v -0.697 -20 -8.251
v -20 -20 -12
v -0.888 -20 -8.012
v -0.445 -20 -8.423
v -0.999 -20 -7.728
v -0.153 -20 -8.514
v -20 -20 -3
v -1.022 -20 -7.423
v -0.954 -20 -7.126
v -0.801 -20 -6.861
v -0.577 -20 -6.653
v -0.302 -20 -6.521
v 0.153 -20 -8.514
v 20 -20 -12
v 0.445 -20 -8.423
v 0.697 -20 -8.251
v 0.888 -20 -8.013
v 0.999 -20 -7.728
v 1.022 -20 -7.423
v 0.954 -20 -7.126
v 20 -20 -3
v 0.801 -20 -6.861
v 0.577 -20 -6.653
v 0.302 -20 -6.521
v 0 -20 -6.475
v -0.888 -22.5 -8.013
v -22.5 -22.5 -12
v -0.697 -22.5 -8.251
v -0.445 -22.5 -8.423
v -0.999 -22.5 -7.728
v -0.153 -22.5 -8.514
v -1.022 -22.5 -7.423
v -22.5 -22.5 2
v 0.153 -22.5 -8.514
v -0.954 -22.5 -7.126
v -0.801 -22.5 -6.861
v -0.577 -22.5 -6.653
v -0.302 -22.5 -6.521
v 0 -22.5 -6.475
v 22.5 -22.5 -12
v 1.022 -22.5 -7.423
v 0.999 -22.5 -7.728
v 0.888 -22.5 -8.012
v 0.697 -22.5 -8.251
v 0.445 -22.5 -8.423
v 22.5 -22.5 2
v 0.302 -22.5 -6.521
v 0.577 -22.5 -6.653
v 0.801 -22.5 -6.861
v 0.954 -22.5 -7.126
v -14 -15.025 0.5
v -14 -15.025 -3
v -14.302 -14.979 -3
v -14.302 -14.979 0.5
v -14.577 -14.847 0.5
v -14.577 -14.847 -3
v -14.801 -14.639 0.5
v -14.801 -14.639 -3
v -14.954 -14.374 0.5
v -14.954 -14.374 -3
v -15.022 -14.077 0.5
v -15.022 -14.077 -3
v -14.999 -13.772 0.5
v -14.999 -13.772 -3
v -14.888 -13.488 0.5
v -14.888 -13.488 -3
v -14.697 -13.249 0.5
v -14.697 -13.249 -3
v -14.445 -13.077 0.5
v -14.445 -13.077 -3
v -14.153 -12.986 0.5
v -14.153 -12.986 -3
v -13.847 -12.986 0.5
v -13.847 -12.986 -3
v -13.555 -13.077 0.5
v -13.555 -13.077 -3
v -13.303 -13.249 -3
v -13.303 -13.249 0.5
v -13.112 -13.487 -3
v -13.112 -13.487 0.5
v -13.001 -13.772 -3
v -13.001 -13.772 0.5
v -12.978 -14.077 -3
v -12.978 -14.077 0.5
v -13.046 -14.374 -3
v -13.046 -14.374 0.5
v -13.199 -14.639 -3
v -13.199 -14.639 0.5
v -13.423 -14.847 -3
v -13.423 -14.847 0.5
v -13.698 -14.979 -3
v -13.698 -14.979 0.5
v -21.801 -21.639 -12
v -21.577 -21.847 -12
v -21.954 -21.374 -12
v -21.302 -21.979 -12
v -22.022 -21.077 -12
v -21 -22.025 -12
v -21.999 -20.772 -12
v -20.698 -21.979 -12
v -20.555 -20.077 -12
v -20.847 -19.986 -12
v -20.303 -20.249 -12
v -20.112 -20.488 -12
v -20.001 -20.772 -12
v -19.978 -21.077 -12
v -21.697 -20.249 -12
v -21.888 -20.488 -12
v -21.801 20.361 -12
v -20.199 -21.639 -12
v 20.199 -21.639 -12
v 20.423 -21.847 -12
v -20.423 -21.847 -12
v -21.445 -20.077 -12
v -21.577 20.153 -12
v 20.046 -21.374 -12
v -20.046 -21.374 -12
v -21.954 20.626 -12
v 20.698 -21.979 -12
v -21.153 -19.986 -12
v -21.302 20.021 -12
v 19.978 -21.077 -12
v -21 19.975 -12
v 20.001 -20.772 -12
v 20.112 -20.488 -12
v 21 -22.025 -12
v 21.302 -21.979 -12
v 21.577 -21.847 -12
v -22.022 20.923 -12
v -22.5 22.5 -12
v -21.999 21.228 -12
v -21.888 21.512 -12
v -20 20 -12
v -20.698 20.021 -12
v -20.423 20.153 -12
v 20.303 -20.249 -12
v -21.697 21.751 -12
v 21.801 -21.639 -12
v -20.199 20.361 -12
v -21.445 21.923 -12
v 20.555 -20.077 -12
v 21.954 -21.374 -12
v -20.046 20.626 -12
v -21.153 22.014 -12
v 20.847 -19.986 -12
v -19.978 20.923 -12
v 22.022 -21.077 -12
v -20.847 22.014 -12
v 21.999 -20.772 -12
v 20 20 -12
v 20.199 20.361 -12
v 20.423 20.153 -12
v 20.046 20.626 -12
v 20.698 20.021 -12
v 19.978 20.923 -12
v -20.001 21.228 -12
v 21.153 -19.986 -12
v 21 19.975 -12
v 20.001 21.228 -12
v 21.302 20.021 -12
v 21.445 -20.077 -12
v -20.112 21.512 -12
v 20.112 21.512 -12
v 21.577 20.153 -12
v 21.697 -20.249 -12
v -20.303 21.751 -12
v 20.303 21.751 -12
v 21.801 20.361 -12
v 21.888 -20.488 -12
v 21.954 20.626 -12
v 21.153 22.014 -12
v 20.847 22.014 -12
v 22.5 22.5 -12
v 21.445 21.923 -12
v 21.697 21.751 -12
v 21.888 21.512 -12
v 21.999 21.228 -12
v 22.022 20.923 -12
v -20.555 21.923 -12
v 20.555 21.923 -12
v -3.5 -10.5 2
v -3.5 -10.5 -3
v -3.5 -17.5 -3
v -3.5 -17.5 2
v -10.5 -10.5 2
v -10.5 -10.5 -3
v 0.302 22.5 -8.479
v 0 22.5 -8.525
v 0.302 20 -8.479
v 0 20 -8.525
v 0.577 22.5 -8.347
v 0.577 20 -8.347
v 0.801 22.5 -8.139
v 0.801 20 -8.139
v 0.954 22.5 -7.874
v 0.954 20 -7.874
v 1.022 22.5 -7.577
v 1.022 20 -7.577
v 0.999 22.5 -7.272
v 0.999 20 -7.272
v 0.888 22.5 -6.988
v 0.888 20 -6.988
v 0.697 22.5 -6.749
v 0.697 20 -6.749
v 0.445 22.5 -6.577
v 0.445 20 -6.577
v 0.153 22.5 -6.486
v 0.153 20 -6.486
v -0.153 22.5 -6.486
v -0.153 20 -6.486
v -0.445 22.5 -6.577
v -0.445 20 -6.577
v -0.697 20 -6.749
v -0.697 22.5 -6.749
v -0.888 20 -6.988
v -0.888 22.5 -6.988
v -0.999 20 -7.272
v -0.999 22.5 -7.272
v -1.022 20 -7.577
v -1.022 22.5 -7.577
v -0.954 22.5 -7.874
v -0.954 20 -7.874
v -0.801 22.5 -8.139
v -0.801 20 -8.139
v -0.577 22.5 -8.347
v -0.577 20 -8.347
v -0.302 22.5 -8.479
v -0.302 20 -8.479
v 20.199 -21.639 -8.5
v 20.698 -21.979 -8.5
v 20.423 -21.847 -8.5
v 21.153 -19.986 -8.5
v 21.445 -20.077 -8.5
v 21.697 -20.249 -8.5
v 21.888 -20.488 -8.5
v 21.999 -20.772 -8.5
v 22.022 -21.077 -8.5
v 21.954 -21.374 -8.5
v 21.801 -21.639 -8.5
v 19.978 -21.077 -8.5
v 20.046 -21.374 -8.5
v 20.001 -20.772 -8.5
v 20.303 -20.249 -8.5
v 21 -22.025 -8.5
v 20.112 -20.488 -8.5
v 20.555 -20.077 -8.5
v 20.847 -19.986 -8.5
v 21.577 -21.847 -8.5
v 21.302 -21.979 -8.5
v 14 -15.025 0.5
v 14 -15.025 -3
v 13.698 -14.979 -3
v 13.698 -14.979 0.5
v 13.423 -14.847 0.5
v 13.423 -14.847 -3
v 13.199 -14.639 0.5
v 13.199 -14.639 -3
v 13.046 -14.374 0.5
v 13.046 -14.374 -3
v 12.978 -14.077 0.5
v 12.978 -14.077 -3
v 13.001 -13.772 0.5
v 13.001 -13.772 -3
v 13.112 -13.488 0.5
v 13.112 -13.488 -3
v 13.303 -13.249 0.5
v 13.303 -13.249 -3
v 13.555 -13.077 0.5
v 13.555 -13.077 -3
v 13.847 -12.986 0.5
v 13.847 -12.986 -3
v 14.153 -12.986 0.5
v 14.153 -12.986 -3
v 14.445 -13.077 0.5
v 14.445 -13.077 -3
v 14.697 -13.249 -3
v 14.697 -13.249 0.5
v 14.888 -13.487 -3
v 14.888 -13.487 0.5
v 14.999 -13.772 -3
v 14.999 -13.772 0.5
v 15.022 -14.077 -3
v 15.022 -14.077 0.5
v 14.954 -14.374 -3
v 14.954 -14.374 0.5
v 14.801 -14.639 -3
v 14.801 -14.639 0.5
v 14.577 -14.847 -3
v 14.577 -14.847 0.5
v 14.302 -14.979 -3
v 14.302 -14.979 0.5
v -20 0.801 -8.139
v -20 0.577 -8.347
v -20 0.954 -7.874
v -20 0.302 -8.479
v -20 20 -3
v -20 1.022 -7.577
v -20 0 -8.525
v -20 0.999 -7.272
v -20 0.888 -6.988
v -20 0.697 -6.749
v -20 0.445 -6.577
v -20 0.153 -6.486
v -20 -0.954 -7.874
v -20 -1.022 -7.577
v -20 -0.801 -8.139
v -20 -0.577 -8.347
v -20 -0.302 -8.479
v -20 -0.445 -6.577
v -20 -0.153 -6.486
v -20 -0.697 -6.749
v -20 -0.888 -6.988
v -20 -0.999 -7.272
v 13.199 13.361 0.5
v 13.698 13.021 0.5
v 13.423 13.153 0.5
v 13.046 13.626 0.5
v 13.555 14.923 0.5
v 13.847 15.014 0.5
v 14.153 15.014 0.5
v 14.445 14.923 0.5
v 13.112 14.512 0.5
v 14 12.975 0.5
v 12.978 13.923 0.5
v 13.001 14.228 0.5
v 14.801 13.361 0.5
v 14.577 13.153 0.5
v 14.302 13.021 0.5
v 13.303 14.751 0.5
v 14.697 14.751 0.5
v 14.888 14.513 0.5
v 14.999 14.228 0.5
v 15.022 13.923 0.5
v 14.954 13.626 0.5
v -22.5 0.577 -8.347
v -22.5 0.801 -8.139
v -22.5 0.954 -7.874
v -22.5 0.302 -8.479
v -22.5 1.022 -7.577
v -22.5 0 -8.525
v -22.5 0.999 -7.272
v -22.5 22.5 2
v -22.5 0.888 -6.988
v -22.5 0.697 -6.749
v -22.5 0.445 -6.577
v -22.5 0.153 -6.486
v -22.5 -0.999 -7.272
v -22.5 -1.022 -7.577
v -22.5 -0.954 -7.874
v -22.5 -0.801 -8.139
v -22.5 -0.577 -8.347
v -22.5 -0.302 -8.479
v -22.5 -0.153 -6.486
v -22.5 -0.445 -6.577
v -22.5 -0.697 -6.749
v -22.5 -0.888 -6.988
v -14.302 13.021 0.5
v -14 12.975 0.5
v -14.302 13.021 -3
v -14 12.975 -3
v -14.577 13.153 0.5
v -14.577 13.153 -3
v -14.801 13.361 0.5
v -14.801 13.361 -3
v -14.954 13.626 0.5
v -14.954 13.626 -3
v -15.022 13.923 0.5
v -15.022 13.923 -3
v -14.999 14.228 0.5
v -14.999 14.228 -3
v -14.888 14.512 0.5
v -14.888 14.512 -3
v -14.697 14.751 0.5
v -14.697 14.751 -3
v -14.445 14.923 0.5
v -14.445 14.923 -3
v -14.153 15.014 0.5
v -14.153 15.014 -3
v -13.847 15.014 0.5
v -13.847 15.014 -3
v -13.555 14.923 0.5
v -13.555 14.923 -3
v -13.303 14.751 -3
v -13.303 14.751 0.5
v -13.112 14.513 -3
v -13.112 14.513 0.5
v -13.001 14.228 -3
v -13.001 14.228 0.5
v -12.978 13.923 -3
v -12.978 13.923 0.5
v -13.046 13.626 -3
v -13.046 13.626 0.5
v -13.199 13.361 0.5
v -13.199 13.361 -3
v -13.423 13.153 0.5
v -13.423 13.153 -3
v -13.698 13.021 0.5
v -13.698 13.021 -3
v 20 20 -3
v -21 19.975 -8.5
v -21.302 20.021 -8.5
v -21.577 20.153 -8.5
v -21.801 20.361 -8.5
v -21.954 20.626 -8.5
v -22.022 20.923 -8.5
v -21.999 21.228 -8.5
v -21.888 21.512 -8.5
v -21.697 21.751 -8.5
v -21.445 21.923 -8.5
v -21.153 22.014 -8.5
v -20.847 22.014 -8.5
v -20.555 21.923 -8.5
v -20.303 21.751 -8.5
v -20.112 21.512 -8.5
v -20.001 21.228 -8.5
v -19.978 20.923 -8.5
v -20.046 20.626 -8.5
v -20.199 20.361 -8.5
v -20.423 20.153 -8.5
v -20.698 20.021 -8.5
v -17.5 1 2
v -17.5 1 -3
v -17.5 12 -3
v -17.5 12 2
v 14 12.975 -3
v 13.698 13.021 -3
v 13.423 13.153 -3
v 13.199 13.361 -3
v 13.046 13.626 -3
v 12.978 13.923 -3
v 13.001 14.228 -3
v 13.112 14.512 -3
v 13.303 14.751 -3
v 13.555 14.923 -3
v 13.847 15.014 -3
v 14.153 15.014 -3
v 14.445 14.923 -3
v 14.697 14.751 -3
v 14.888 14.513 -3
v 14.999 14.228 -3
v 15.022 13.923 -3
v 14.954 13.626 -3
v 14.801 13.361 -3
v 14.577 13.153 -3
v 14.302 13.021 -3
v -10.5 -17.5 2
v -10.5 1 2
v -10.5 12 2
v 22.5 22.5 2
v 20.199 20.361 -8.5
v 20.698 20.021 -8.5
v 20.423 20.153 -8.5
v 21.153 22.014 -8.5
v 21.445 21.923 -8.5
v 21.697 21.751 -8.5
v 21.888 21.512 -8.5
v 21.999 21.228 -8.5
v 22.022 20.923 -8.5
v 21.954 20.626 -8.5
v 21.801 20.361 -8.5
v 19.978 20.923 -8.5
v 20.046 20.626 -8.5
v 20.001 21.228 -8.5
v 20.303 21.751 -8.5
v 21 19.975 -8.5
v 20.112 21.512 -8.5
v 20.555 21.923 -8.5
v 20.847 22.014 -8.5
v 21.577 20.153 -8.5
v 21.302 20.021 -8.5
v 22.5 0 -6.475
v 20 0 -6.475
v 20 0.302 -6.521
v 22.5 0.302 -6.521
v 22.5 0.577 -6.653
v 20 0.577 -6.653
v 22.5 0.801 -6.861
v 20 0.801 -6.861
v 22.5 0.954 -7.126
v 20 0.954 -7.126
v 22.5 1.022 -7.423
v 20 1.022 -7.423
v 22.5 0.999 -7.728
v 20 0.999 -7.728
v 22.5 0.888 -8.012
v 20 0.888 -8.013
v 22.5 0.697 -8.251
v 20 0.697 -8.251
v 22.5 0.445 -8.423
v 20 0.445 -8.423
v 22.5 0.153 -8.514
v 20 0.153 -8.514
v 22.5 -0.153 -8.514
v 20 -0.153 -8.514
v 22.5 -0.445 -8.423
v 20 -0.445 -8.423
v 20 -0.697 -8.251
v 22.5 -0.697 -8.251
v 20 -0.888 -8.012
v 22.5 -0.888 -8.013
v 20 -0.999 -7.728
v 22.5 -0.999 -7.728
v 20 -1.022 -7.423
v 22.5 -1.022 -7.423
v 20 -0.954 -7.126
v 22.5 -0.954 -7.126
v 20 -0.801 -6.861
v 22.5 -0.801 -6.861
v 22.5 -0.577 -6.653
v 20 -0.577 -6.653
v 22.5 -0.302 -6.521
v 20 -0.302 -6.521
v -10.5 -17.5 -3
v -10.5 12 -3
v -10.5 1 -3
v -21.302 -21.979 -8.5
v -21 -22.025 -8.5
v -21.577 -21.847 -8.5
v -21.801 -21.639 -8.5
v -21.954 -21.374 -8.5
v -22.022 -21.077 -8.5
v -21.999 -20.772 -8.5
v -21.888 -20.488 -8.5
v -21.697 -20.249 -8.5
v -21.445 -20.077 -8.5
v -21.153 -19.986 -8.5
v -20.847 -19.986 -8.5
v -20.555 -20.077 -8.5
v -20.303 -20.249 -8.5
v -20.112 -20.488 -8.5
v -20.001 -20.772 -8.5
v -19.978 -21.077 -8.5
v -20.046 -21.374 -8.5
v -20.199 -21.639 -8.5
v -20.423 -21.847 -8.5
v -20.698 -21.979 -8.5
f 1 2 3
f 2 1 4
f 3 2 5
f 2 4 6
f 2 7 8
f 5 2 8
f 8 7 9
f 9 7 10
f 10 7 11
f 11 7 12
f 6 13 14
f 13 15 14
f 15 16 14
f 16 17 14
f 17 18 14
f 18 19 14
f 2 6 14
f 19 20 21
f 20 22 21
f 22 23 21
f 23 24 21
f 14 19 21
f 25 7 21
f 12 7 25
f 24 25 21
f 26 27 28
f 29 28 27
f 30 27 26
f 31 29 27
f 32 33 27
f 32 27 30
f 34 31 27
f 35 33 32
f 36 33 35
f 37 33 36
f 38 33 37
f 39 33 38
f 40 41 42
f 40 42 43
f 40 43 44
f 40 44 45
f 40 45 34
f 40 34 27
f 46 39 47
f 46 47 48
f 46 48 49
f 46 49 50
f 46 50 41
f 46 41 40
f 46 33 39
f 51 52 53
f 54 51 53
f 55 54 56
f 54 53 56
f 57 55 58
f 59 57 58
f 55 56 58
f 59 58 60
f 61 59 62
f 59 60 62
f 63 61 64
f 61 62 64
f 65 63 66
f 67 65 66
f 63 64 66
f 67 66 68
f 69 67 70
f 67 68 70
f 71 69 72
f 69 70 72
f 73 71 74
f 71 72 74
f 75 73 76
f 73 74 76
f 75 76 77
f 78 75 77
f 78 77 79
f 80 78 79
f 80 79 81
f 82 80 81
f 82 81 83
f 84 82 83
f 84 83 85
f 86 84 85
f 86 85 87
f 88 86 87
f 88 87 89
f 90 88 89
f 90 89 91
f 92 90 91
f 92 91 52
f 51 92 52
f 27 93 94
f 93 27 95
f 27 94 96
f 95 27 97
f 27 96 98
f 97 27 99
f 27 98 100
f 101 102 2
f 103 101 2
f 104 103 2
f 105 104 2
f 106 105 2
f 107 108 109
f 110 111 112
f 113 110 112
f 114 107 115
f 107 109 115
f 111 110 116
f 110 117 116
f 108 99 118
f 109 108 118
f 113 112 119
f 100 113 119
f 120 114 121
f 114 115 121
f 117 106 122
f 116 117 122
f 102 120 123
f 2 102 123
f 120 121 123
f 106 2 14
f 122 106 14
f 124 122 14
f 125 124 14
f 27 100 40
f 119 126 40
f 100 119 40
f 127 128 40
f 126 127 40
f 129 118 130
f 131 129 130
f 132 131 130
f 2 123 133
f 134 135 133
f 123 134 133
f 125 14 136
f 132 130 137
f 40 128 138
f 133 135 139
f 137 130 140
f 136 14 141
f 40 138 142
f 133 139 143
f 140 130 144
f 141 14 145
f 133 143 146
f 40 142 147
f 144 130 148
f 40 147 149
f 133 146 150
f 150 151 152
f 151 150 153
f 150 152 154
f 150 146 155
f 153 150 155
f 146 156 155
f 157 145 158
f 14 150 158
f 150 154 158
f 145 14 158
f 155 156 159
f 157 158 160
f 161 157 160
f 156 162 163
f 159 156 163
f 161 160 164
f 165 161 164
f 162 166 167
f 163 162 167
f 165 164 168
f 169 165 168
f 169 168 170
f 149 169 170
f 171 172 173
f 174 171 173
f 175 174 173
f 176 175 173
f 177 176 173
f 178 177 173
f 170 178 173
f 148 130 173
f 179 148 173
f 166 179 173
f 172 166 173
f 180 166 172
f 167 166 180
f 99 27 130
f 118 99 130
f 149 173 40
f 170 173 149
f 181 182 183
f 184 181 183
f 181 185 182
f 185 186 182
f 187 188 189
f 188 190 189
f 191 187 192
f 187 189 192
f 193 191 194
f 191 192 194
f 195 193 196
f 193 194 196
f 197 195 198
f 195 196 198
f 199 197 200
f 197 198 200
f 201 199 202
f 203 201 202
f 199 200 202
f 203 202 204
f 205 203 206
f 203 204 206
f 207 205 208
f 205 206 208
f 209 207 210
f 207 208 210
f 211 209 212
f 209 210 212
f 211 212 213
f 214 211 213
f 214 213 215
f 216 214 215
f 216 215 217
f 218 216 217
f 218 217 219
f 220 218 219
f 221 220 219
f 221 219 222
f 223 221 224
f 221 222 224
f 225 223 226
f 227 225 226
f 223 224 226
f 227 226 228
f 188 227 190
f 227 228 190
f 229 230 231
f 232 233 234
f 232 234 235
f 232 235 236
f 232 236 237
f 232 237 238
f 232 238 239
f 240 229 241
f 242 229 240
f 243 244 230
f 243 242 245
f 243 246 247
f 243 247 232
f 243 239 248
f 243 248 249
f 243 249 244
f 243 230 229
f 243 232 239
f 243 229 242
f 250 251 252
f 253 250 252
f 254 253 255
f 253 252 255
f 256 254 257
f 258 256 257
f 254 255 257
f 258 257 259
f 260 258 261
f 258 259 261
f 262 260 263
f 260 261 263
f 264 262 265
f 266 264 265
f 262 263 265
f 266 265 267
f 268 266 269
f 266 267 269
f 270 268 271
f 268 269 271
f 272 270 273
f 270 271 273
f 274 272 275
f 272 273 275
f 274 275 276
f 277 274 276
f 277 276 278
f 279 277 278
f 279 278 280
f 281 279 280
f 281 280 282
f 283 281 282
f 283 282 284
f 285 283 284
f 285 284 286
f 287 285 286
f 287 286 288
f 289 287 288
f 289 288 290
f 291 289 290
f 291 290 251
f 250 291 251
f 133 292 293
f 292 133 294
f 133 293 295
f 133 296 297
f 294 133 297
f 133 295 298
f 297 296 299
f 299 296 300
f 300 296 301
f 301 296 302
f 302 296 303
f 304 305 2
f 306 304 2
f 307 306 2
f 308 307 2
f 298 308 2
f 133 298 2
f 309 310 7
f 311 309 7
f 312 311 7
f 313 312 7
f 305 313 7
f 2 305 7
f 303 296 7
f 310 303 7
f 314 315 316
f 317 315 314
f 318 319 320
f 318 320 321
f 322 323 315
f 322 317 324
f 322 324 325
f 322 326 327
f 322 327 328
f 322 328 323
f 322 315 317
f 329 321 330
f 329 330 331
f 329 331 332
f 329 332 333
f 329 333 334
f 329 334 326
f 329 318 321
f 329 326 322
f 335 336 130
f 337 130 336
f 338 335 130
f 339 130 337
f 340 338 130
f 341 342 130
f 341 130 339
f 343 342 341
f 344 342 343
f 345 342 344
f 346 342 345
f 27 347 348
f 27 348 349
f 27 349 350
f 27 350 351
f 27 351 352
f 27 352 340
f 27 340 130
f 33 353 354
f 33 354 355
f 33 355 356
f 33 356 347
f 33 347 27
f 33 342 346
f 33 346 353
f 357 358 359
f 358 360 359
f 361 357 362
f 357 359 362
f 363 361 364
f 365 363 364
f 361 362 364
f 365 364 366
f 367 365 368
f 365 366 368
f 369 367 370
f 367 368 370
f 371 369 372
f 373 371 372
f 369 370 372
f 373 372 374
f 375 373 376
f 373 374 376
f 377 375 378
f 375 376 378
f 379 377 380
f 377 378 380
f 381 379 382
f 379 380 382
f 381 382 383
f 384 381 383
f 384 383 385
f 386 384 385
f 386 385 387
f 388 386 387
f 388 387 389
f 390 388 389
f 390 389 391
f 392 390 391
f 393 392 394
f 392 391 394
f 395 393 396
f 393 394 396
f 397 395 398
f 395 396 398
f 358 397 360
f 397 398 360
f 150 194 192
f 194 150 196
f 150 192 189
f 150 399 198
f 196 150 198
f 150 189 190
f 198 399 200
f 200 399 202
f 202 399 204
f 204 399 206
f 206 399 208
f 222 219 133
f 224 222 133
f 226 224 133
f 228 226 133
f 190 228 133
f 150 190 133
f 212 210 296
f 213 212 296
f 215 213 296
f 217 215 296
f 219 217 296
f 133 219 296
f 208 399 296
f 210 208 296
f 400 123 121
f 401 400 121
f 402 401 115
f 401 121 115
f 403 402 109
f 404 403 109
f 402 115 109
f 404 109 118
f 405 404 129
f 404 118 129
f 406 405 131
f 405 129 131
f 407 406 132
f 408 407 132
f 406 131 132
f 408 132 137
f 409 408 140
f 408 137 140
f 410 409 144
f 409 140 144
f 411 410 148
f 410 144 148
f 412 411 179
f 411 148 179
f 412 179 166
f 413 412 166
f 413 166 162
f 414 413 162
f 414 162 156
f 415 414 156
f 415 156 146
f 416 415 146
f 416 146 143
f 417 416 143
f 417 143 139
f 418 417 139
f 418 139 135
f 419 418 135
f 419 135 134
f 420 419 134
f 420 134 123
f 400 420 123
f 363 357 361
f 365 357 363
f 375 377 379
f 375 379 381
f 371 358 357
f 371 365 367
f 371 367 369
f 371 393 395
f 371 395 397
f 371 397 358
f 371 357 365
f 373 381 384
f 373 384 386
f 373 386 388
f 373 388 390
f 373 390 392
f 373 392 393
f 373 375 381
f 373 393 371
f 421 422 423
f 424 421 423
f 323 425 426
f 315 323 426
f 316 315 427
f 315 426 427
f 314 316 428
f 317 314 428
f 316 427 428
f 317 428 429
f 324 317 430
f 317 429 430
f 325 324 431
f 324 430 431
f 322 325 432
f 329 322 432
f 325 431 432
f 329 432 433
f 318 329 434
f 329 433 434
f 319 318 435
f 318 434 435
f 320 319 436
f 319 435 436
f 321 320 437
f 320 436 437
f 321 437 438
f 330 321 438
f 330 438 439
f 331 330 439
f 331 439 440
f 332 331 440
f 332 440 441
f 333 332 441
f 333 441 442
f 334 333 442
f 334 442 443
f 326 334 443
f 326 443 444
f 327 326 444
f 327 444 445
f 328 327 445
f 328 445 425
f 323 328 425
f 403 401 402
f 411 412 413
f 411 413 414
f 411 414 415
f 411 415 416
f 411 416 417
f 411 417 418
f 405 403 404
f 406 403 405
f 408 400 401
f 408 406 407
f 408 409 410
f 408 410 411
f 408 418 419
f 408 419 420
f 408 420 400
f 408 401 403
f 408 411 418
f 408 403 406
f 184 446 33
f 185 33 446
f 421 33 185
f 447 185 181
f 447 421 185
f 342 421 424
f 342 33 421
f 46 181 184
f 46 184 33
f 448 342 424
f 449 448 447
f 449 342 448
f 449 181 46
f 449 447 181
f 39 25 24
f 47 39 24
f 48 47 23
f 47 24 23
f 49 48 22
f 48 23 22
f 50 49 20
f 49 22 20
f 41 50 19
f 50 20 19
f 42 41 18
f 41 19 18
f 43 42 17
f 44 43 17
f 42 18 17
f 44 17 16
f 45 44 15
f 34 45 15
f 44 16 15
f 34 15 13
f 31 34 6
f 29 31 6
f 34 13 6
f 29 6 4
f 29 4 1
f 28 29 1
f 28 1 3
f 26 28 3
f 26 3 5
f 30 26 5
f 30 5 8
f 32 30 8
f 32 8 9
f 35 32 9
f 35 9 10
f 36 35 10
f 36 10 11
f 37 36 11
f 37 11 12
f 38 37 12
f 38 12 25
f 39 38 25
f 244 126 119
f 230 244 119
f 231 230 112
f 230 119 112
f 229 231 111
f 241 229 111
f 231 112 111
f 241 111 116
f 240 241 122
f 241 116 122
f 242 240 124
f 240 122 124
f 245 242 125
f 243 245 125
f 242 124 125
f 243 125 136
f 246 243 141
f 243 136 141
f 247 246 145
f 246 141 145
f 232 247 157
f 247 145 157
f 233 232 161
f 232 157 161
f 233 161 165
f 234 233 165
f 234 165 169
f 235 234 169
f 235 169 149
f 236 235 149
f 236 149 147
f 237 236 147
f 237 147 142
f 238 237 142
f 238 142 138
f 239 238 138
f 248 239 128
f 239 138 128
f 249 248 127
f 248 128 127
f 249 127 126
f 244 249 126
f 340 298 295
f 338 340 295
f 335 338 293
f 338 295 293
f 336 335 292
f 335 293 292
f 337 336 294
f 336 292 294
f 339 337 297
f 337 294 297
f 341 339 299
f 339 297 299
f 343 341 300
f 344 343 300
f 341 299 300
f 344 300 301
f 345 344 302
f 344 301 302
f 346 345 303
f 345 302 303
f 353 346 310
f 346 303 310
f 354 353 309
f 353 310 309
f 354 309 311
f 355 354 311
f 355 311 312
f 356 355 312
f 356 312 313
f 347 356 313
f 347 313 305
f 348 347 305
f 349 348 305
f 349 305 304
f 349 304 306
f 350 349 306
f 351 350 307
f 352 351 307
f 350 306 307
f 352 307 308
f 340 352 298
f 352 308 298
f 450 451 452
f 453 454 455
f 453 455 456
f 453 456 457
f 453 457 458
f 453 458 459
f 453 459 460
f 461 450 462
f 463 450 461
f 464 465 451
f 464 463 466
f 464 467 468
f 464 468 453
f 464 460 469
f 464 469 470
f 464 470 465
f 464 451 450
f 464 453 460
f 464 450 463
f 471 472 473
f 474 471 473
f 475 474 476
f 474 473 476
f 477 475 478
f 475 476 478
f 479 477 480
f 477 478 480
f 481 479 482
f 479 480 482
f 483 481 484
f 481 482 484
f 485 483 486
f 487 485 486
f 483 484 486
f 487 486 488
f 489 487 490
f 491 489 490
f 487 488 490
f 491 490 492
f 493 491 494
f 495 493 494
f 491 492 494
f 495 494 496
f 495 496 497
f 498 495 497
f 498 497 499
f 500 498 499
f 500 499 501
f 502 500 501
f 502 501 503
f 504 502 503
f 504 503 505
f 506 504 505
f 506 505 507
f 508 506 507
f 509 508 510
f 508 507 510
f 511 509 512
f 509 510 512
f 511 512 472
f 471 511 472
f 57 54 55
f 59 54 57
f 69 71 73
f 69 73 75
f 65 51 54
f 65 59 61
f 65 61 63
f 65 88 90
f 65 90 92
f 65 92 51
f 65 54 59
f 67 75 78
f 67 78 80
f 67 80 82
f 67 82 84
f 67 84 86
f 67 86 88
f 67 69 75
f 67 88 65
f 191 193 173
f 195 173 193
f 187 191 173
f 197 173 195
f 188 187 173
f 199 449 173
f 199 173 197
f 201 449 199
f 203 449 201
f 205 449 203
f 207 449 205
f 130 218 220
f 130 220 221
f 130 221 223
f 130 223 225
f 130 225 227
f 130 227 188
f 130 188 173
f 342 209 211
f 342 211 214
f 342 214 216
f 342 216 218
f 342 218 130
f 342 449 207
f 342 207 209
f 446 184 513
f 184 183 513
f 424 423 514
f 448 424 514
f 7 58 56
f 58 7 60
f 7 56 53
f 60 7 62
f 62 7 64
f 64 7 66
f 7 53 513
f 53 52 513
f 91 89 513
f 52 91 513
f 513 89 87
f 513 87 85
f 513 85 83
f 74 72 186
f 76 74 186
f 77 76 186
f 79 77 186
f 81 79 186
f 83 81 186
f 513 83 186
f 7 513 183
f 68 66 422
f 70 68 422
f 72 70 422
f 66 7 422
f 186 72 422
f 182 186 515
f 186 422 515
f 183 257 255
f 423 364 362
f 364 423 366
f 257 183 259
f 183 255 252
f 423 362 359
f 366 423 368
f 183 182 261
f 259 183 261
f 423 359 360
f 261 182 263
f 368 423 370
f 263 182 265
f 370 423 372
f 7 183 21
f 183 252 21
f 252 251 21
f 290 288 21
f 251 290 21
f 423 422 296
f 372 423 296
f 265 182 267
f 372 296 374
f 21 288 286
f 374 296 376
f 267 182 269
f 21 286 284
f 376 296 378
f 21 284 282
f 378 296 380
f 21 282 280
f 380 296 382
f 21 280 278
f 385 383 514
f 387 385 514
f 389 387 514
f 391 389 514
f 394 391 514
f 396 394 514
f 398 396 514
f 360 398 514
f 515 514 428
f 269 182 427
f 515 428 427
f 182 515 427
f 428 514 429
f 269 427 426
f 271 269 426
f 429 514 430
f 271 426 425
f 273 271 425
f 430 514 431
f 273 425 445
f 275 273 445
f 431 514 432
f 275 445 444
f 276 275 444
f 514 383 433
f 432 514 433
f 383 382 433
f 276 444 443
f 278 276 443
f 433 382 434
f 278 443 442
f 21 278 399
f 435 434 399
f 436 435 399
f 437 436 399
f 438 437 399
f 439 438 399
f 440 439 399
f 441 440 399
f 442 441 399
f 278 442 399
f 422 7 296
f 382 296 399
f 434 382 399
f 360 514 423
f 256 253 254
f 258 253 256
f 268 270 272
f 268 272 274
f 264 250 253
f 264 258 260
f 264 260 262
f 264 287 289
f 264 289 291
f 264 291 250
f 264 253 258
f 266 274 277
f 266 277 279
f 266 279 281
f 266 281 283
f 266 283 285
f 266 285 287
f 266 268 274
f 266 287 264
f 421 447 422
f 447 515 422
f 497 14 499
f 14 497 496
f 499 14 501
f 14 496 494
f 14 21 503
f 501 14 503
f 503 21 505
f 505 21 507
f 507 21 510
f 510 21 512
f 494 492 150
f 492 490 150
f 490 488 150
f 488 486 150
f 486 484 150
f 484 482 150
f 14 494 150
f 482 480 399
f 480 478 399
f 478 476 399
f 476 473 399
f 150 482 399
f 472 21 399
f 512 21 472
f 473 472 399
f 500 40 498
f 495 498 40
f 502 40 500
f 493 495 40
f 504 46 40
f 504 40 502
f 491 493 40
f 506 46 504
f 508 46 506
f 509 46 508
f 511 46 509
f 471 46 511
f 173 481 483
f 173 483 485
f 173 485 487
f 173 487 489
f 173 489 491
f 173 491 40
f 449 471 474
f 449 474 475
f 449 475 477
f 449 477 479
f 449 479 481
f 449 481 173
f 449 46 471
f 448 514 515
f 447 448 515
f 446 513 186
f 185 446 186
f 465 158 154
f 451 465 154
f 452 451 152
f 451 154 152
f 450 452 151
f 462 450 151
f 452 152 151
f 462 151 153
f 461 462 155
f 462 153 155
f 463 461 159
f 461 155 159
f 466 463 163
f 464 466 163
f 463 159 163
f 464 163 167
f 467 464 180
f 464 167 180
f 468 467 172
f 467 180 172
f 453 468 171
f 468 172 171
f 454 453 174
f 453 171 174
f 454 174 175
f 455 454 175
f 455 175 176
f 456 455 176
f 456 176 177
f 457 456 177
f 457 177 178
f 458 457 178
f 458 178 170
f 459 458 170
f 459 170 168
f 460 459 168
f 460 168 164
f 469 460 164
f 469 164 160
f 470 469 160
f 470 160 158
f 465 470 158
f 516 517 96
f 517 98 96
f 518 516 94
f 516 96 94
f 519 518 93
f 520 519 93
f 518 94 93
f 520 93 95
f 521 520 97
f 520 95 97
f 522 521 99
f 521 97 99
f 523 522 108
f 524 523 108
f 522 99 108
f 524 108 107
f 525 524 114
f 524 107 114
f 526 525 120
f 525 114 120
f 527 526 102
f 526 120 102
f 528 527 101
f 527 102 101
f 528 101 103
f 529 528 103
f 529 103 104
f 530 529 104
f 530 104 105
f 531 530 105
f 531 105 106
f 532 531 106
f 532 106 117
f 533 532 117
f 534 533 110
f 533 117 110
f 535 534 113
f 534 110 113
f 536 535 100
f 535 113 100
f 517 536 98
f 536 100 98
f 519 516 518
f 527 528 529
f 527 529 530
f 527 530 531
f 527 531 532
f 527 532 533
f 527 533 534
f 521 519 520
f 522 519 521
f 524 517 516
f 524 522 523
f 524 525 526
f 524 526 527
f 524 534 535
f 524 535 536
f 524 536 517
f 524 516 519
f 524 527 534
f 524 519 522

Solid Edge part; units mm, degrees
sketch "Sketch1" plane through (0, 0, 0) normal (0, 0, 1) x (1, 0, 0)
  line L0 (-22.5, -22.5) -> (22.5, -22.5)
  line L1 (22.5, -22.5) -> (22.5, 22.5)
  line L2 (22.5, 22.5) -> (-22.5, 22.5)
  line L3 (-22.5, 22.5) -> (-22.5, -22.5)
  line L4 (-20, -20) -> (20, -20)
  line L5 (20, -20) -> (20, 20)
  line L6 (20, 20) -> (-20, 20)
  line L7 (-20, 20) -> (-20, -20)
  dimension "D1" = 40
  dimension "D2" = 40
  dimension "D3" = 45
  dimension "D4" = 45
extrude "Protrusion1" add sketch "Sketch1" against normal blind 12
sketch "Sketch2" plane through (0, 0, 0) normal (0, 0, 1) x (1, 0, 0)
  line L0 (-20, 20) -> (-20, -20)
  line L1 (-20, -20) -> (20, -20)
  line L2 (20, -20) -> (20, 20)
  line L3 (20, 20) -> (-20, 20)
extrude "ExtrudedProtrusion_2" add sketch "Sketch2" against normal blind 3
sketch "Sketch3" plane through (0, 0, -12) normal (0, 0, -1) x (0, -1, 0)
  circle A0 centre (-21, 21) radius 1.025
  circle A1 centre (-21, -21) radius 1.025
  circle A2 centre (21, -21) radius 1.025
  circle A3 centre (21, 21) radius 1.025
  dimension "D1" = 2.05
  dimension "D2" = 2.05
  dimension "D3" = 2.05
  dimension "D4" = 1.5
  dimension "D5" = 1.5
  dimension "D6" = 1.5
  dimension "D7" = 2.05
  dimension "D8" = 1.5
  dimension "D9" = 1.5
extrude "ExtrudedCutout_1" cut sketch "Sketch3" against normal blind 3.5
sketch "Sketch4" plane through (0, 0, 0) normal (0, 0, 1) x (0, 1, 0)
  line L0 (-17.5, 10.5) -> (-10.5, 10.5)
  line L1 (-10.5, 10.5) -> (-10.5, 3.5)
  line L2 (-10.5, 3.5) -> (-17.5, 3.5)
  line L3 (-17.5, 3.5) -> (-17.5, 10.5)
  line L4 (1, 17.5) -> (12, 17.5)
  line L5 (12, 17.5) -> (12, 10.5)
  line L6 (12, 10.5) -> (1, 10.5)
  line L7 (1, 10.5) -> (1, 17.5)
  dimension "D1" = 7
  dimension "D2" = 7
  dimension "D3" = 11
  dimension "D4" = 7
  dimension "D5" = 5
  dimension "D6" = 16
  dimension "D7" = 15.5
  dimension "D8" = 5
extrude "Cutout1" cut sketch "Sketch4" along normal through all and the other way through all
sketch "Sketch5" plane through (0, 0, 0) normal (0, 0, 1) x (1, 0, 0)
  line L0 (-22.5, 22.5) -> (-22.5, -22.5)
  line L1 (-22.5, -22.5) -> (22.5, -22.5)
  line L2 (22.5, -22.5) -> (22.5, 22.5)
  line L3 (22.5, 22.5) -> (-22.5, 22.5)
extrude "ExtrudedProtrusion_3" add sketch "Sketch5" along normal blind 2
sketch "Sketch6" plane through (0, 0, 0) normal (0, 0, 1) x (0, 1, 0)
  line L0 (1, 10.5) -> (1, 17.5)
  line L1 (1, 17.5) -> (12, 17.5)
  line L2 (12, 17.5) -> (12, 10.5)
  line L3 (12, 10.5) -> (1, 10.5)
  line L4 (-10.5, 10.5) -> (-10.5, 3.5)
  line L5 (-10.5, 3.5) -> (-17.5, 3.5)
  line L6 (-17.5, 3.5) -> (-17.5, 10.5)
  line L7 (-17.5, 10.5) -> (-10.5, 10.5)
  dimension "D1" = 7
  dimension "D2" = 7
  dimension "D3" = 11
  dimension "D4" = 7
  dimension "D5" = 5
  dimension "D6" = 16
  dimension "D7" = 15.5
  dimension "D8" = 5
extrude "ExtrudedCutout_4" cut sketch "Sketch6" along normal blind 33.1838
sketch "Sketch7" plane through (0, 0, -3) normal (0, 0, -1) x (0, -1, 0)
  circle A0 centre (-14, 14) radius 1.025
  circle A1 centre (14, 14) radius 1.025
  circle A2 centre (-14, -14) radius 1.025
  circle A3 centre (14, -14) radius 1.025
  dimension "D1" = 2.05
  dimension "D2" = 2.05
  dimension "D3" = 2.05
  dimension "D4" = 28
  dimension "D5" = 28
extrude "ExtrudedCutout_5" cut sketch "Sketch7" against normal blind 3.5
hole "Hole_2" at (20, 0, -7.5) direction (-1, 0, 0) diameter 2.05 end through all both ways yes
hole "Hole_3" at (0, -20, -7.5) direction (0, 1, 0) diameter 2.05 end through all both ways yes
properties part number "BumbleB0361"
